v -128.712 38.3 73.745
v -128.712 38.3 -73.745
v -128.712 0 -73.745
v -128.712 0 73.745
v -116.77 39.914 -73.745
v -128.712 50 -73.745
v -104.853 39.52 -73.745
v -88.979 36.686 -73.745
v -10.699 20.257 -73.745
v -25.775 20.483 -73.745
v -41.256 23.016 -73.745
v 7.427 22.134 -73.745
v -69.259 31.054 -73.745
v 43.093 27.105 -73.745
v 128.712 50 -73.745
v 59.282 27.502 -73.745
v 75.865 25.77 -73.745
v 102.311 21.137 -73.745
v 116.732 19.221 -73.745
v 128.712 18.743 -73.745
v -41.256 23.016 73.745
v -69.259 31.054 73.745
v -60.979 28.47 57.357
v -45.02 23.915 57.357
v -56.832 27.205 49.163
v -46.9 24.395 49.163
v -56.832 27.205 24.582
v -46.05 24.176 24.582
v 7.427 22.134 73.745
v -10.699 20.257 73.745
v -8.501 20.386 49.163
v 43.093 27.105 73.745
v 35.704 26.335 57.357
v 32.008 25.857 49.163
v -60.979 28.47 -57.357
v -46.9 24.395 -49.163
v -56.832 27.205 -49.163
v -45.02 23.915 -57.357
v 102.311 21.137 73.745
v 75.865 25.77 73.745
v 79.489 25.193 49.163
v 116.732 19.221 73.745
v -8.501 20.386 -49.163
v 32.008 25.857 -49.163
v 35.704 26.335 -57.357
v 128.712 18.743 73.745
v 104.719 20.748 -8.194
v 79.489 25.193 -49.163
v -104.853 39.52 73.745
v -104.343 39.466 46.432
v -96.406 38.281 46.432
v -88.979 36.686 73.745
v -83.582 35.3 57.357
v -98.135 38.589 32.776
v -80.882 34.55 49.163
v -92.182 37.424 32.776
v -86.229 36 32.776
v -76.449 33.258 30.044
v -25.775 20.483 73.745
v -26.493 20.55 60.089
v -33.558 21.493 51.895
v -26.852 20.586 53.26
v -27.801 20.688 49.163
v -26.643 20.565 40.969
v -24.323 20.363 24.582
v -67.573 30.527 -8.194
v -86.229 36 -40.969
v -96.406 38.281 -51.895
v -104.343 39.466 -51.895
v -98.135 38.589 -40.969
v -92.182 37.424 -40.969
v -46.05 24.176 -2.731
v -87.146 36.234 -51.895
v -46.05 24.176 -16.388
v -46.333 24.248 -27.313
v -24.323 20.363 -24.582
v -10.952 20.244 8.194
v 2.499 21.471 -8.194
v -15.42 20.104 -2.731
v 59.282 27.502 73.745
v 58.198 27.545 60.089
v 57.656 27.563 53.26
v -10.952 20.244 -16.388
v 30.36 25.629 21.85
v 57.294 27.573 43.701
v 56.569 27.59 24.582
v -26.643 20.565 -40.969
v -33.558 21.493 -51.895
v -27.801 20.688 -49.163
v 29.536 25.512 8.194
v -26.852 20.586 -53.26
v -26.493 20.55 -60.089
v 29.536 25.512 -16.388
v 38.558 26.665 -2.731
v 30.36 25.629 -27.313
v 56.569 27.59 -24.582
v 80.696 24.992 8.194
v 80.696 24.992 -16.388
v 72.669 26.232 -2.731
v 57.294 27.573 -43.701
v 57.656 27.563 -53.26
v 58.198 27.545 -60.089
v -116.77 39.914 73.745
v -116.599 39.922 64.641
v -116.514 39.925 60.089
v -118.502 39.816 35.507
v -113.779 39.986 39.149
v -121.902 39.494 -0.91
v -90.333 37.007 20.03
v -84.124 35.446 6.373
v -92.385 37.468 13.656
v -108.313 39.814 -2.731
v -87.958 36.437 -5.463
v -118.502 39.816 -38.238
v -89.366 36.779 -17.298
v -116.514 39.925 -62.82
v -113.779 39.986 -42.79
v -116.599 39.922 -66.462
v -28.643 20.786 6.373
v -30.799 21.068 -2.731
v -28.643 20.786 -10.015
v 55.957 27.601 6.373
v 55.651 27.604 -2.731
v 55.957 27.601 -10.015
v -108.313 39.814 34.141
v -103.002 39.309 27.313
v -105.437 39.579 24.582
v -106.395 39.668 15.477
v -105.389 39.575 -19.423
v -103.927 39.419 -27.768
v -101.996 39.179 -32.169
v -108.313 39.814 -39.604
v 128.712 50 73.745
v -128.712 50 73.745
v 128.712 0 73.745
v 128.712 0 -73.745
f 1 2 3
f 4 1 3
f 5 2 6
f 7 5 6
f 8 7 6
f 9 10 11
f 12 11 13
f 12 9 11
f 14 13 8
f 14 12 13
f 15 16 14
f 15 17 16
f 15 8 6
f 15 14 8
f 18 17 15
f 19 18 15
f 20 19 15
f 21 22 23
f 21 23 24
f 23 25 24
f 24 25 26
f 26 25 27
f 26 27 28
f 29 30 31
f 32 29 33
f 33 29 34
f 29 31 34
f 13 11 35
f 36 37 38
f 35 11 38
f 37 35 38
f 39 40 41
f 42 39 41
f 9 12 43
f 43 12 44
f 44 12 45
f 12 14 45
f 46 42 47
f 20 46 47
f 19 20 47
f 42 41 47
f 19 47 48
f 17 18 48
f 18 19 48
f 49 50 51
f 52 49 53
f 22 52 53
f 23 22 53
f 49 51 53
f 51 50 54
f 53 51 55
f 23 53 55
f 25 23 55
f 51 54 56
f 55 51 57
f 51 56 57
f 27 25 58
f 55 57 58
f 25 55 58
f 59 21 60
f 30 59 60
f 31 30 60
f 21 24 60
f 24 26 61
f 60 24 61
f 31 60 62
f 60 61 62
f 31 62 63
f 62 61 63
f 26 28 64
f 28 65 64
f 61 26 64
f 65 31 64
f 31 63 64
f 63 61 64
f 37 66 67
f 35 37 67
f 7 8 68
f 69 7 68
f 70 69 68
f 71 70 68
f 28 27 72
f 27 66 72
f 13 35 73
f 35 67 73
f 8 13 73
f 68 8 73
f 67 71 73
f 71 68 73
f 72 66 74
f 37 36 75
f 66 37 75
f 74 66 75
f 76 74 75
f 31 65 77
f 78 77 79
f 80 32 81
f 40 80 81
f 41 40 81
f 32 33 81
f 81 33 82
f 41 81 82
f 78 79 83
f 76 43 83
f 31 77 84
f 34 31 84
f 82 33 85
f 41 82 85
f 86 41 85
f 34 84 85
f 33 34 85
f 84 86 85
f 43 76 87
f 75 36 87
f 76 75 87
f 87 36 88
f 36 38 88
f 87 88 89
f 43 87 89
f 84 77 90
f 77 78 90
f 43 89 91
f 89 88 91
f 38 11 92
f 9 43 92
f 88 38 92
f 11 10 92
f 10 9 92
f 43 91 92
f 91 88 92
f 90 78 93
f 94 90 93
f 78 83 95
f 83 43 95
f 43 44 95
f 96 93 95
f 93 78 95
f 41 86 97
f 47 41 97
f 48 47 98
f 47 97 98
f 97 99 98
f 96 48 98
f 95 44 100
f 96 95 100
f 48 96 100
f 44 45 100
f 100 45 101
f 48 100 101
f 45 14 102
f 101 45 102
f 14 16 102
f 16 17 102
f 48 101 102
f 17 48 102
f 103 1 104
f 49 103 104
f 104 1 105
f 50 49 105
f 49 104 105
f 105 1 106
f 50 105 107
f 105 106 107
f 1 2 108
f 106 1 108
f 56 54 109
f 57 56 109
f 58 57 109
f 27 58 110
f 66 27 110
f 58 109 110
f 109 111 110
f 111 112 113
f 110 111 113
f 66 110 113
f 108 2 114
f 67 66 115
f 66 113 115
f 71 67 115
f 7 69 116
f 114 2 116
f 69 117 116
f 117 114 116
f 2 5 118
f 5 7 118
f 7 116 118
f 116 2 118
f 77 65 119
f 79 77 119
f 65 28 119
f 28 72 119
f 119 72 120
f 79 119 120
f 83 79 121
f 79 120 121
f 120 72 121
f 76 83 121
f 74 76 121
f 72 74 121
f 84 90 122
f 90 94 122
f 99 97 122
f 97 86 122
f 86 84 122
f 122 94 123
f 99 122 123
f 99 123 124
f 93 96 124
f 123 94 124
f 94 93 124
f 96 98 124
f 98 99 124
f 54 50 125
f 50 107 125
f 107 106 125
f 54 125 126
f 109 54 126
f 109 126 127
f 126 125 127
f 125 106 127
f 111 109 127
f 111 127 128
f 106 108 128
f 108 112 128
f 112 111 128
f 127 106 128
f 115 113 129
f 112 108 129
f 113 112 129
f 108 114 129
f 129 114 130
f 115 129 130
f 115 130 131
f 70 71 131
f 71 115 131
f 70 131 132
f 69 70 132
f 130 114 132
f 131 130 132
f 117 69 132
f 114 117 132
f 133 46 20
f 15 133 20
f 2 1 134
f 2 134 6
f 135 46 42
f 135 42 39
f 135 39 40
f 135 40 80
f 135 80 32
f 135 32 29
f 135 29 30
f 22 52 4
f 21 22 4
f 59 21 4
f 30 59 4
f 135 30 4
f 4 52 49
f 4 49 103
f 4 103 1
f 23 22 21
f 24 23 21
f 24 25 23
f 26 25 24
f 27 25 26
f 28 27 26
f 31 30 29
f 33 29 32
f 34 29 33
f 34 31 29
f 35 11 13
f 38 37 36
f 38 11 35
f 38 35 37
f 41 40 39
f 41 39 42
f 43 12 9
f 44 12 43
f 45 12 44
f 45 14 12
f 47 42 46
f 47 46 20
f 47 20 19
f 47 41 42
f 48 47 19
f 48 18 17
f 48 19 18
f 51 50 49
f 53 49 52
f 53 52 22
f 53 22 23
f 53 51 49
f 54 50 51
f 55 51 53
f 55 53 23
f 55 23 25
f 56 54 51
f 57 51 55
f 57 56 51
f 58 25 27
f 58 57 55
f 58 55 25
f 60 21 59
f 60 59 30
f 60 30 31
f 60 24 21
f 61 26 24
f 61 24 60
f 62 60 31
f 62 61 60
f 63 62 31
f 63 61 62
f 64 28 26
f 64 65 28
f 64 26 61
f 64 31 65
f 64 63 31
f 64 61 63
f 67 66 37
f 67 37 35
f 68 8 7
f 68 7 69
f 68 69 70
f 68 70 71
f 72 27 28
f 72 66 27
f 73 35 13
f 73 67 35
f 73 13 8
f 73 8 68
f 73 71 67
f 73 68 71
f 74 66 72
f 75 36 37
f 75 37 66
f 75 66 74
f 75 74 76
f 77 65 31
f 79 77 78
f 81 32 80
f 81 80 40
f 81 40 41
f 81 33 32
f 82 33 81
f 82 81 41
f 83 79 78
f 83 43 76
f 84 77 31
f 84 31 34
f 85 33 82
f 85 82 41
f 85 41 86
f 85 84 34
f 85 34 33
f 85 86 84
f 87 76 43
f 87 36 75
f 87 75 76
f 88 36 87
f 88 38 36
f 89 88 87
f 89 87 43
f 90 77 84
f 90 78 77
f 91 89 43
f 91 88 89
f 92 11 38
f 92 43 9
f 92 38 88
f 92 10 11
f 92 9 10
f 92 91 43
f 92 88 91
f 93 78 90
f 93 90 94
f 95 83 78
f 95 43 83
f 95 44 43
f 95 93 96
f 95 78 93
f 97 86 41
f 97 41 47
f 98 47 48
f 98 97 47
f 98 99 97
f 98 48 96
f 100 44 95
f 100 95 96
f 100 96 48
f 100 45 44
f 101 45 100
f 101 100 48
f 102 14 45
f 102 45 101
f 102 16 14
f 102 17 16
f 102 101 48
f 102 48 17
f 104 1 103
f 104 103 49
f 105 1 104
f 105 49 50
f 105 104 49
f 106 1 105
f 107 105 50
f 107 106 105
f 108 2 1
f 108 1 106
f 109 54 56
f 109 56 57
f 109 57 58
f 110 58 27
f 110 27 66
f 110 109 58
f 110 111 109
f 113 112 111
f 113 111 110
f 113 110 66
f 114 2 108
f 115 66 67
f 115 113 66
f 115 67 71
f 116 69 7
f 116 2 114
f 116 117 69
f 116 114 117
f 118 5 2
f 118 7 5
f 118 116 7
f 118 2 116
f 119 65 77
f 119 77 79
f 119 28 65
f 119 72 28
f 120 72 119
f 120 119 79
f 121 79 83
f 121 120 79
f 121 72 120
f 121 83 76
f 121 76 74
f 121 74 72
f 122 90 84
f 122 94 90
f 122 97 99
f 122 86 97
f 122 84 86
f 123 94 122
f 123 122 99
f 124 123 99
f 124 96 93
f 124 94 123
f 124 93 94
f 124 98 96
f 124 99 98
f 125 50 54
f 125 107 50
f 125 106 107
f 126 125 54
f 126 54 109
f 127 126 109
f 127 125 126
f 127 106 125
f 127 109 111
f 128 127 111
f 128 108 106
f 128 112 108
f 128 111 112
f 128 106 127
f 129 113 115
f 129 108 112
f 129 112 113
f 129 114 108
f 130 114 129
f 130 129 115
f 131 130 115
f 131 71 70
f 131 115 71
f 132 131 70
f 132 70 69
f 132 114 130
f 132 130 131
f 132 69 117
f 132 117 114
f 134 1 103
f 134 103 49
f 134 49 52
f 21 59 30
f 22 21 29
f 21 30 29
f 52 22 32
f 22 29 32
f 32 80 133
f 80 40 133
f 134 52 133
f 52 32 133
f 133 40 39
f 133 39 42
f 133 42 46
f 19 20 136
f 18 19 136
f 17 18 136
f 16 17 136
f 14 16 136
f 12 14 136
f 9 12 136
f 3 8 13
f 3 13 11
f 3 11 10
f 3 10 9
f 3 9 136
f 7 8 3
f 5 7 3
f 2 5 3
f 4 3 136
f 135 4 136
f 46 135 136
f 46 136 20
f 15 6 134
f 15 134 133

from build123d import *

# Parameters (mm, degrees)
SKETCH1_W           = 257.423641252
SKETCH1_H           = 147.49006692
BOSS_EXTRUDE1_DEPTH = 50
INTERSECT1_START    = -73.74503346
INTERSECT1_DEPTH    = 147.49006692
INTERSECT1_2_DEPTH  = 147.49006692


# Read off the part's stored shape, not the designer's step: Intersect1
with BuildPart() as part:
    # Sketch1 → Boss-Extrude1 (new body)
    with BuildSketch(Plane(origin=(0, 0, 0), x_dir=(1, 0, 0), z_dir=(0, 1, 0))):
        Rectangle(SKETCH1_W, SKETCH1_H)
    extrude(amount=BOSS_EXTRUDE1_DEPTH)

    # Intersect1 outline → Intersect1 (cut)
    with BuildSketch(Plane.XY.offset(INTERSECT1_START)):
        with BuildLine():
            add(Edge.make_bspline(
                [(-128.711820626, 38.300263387), (-93.95042027, 46.3677643), (-33.928882118, 5.417498568), (54.115890209, 36.883510422), (104.708521915, 18.332859687), (128.711820626, 18.743046177)],
                knots=[0.102331594, 0.102331594, 0.102331594, 0.102331594, 0.428404103, 0.673907152, 0.894339808, 0.894339808, 0.894339808, 0.894339808], degree=3))
            Line((-128.711820626, 38.300263387), (-128.711820626, 0))
            Line((-128.711820626, 0), (128.711820626, 0))
            Line((128.711820626, 0), (128.711820626, 18.743046177))
        make_face()
    extrude(amount=INTERSECT1_DEPTH, mode=Mode.SUBTRACT)


with BuildPart() as body_2:
    # Intersect1 2 outline → Intersect1 2 (new body)
    with BuildSketch(Plane.XY.offset(INTERSECT1_START)):
        with BuildLine():
            add(Edge.make_bspline(
                [(-128.711820626, 38.300263387), (-93.95042027, 46.3677643), (-33.928882118, 5.417498568), (54.115890209, 36.883510422), (104.708521915, 18.332859687), (128.711820626, 18.743046177)],
                knots=[0.102331594, 0.102331594, 0.102331594, 0.102331594, 0.428404103, 0.673907152, 0.894339808, 0.894339808, 0.894339808, 0.894339808], degree=3))
            Line((-128.711820626, 38.300263387), (-128.711820626, 0))
            Line((-128.711820626, 0), (128.711820626, 0))
            Line((128.711820626, 0), (128.711820626, 18.743046177))
        make_face()
    extrude(amount=INTERSECT1_2_DEPTH)


solid = Compound([part.part, body_2.part])
